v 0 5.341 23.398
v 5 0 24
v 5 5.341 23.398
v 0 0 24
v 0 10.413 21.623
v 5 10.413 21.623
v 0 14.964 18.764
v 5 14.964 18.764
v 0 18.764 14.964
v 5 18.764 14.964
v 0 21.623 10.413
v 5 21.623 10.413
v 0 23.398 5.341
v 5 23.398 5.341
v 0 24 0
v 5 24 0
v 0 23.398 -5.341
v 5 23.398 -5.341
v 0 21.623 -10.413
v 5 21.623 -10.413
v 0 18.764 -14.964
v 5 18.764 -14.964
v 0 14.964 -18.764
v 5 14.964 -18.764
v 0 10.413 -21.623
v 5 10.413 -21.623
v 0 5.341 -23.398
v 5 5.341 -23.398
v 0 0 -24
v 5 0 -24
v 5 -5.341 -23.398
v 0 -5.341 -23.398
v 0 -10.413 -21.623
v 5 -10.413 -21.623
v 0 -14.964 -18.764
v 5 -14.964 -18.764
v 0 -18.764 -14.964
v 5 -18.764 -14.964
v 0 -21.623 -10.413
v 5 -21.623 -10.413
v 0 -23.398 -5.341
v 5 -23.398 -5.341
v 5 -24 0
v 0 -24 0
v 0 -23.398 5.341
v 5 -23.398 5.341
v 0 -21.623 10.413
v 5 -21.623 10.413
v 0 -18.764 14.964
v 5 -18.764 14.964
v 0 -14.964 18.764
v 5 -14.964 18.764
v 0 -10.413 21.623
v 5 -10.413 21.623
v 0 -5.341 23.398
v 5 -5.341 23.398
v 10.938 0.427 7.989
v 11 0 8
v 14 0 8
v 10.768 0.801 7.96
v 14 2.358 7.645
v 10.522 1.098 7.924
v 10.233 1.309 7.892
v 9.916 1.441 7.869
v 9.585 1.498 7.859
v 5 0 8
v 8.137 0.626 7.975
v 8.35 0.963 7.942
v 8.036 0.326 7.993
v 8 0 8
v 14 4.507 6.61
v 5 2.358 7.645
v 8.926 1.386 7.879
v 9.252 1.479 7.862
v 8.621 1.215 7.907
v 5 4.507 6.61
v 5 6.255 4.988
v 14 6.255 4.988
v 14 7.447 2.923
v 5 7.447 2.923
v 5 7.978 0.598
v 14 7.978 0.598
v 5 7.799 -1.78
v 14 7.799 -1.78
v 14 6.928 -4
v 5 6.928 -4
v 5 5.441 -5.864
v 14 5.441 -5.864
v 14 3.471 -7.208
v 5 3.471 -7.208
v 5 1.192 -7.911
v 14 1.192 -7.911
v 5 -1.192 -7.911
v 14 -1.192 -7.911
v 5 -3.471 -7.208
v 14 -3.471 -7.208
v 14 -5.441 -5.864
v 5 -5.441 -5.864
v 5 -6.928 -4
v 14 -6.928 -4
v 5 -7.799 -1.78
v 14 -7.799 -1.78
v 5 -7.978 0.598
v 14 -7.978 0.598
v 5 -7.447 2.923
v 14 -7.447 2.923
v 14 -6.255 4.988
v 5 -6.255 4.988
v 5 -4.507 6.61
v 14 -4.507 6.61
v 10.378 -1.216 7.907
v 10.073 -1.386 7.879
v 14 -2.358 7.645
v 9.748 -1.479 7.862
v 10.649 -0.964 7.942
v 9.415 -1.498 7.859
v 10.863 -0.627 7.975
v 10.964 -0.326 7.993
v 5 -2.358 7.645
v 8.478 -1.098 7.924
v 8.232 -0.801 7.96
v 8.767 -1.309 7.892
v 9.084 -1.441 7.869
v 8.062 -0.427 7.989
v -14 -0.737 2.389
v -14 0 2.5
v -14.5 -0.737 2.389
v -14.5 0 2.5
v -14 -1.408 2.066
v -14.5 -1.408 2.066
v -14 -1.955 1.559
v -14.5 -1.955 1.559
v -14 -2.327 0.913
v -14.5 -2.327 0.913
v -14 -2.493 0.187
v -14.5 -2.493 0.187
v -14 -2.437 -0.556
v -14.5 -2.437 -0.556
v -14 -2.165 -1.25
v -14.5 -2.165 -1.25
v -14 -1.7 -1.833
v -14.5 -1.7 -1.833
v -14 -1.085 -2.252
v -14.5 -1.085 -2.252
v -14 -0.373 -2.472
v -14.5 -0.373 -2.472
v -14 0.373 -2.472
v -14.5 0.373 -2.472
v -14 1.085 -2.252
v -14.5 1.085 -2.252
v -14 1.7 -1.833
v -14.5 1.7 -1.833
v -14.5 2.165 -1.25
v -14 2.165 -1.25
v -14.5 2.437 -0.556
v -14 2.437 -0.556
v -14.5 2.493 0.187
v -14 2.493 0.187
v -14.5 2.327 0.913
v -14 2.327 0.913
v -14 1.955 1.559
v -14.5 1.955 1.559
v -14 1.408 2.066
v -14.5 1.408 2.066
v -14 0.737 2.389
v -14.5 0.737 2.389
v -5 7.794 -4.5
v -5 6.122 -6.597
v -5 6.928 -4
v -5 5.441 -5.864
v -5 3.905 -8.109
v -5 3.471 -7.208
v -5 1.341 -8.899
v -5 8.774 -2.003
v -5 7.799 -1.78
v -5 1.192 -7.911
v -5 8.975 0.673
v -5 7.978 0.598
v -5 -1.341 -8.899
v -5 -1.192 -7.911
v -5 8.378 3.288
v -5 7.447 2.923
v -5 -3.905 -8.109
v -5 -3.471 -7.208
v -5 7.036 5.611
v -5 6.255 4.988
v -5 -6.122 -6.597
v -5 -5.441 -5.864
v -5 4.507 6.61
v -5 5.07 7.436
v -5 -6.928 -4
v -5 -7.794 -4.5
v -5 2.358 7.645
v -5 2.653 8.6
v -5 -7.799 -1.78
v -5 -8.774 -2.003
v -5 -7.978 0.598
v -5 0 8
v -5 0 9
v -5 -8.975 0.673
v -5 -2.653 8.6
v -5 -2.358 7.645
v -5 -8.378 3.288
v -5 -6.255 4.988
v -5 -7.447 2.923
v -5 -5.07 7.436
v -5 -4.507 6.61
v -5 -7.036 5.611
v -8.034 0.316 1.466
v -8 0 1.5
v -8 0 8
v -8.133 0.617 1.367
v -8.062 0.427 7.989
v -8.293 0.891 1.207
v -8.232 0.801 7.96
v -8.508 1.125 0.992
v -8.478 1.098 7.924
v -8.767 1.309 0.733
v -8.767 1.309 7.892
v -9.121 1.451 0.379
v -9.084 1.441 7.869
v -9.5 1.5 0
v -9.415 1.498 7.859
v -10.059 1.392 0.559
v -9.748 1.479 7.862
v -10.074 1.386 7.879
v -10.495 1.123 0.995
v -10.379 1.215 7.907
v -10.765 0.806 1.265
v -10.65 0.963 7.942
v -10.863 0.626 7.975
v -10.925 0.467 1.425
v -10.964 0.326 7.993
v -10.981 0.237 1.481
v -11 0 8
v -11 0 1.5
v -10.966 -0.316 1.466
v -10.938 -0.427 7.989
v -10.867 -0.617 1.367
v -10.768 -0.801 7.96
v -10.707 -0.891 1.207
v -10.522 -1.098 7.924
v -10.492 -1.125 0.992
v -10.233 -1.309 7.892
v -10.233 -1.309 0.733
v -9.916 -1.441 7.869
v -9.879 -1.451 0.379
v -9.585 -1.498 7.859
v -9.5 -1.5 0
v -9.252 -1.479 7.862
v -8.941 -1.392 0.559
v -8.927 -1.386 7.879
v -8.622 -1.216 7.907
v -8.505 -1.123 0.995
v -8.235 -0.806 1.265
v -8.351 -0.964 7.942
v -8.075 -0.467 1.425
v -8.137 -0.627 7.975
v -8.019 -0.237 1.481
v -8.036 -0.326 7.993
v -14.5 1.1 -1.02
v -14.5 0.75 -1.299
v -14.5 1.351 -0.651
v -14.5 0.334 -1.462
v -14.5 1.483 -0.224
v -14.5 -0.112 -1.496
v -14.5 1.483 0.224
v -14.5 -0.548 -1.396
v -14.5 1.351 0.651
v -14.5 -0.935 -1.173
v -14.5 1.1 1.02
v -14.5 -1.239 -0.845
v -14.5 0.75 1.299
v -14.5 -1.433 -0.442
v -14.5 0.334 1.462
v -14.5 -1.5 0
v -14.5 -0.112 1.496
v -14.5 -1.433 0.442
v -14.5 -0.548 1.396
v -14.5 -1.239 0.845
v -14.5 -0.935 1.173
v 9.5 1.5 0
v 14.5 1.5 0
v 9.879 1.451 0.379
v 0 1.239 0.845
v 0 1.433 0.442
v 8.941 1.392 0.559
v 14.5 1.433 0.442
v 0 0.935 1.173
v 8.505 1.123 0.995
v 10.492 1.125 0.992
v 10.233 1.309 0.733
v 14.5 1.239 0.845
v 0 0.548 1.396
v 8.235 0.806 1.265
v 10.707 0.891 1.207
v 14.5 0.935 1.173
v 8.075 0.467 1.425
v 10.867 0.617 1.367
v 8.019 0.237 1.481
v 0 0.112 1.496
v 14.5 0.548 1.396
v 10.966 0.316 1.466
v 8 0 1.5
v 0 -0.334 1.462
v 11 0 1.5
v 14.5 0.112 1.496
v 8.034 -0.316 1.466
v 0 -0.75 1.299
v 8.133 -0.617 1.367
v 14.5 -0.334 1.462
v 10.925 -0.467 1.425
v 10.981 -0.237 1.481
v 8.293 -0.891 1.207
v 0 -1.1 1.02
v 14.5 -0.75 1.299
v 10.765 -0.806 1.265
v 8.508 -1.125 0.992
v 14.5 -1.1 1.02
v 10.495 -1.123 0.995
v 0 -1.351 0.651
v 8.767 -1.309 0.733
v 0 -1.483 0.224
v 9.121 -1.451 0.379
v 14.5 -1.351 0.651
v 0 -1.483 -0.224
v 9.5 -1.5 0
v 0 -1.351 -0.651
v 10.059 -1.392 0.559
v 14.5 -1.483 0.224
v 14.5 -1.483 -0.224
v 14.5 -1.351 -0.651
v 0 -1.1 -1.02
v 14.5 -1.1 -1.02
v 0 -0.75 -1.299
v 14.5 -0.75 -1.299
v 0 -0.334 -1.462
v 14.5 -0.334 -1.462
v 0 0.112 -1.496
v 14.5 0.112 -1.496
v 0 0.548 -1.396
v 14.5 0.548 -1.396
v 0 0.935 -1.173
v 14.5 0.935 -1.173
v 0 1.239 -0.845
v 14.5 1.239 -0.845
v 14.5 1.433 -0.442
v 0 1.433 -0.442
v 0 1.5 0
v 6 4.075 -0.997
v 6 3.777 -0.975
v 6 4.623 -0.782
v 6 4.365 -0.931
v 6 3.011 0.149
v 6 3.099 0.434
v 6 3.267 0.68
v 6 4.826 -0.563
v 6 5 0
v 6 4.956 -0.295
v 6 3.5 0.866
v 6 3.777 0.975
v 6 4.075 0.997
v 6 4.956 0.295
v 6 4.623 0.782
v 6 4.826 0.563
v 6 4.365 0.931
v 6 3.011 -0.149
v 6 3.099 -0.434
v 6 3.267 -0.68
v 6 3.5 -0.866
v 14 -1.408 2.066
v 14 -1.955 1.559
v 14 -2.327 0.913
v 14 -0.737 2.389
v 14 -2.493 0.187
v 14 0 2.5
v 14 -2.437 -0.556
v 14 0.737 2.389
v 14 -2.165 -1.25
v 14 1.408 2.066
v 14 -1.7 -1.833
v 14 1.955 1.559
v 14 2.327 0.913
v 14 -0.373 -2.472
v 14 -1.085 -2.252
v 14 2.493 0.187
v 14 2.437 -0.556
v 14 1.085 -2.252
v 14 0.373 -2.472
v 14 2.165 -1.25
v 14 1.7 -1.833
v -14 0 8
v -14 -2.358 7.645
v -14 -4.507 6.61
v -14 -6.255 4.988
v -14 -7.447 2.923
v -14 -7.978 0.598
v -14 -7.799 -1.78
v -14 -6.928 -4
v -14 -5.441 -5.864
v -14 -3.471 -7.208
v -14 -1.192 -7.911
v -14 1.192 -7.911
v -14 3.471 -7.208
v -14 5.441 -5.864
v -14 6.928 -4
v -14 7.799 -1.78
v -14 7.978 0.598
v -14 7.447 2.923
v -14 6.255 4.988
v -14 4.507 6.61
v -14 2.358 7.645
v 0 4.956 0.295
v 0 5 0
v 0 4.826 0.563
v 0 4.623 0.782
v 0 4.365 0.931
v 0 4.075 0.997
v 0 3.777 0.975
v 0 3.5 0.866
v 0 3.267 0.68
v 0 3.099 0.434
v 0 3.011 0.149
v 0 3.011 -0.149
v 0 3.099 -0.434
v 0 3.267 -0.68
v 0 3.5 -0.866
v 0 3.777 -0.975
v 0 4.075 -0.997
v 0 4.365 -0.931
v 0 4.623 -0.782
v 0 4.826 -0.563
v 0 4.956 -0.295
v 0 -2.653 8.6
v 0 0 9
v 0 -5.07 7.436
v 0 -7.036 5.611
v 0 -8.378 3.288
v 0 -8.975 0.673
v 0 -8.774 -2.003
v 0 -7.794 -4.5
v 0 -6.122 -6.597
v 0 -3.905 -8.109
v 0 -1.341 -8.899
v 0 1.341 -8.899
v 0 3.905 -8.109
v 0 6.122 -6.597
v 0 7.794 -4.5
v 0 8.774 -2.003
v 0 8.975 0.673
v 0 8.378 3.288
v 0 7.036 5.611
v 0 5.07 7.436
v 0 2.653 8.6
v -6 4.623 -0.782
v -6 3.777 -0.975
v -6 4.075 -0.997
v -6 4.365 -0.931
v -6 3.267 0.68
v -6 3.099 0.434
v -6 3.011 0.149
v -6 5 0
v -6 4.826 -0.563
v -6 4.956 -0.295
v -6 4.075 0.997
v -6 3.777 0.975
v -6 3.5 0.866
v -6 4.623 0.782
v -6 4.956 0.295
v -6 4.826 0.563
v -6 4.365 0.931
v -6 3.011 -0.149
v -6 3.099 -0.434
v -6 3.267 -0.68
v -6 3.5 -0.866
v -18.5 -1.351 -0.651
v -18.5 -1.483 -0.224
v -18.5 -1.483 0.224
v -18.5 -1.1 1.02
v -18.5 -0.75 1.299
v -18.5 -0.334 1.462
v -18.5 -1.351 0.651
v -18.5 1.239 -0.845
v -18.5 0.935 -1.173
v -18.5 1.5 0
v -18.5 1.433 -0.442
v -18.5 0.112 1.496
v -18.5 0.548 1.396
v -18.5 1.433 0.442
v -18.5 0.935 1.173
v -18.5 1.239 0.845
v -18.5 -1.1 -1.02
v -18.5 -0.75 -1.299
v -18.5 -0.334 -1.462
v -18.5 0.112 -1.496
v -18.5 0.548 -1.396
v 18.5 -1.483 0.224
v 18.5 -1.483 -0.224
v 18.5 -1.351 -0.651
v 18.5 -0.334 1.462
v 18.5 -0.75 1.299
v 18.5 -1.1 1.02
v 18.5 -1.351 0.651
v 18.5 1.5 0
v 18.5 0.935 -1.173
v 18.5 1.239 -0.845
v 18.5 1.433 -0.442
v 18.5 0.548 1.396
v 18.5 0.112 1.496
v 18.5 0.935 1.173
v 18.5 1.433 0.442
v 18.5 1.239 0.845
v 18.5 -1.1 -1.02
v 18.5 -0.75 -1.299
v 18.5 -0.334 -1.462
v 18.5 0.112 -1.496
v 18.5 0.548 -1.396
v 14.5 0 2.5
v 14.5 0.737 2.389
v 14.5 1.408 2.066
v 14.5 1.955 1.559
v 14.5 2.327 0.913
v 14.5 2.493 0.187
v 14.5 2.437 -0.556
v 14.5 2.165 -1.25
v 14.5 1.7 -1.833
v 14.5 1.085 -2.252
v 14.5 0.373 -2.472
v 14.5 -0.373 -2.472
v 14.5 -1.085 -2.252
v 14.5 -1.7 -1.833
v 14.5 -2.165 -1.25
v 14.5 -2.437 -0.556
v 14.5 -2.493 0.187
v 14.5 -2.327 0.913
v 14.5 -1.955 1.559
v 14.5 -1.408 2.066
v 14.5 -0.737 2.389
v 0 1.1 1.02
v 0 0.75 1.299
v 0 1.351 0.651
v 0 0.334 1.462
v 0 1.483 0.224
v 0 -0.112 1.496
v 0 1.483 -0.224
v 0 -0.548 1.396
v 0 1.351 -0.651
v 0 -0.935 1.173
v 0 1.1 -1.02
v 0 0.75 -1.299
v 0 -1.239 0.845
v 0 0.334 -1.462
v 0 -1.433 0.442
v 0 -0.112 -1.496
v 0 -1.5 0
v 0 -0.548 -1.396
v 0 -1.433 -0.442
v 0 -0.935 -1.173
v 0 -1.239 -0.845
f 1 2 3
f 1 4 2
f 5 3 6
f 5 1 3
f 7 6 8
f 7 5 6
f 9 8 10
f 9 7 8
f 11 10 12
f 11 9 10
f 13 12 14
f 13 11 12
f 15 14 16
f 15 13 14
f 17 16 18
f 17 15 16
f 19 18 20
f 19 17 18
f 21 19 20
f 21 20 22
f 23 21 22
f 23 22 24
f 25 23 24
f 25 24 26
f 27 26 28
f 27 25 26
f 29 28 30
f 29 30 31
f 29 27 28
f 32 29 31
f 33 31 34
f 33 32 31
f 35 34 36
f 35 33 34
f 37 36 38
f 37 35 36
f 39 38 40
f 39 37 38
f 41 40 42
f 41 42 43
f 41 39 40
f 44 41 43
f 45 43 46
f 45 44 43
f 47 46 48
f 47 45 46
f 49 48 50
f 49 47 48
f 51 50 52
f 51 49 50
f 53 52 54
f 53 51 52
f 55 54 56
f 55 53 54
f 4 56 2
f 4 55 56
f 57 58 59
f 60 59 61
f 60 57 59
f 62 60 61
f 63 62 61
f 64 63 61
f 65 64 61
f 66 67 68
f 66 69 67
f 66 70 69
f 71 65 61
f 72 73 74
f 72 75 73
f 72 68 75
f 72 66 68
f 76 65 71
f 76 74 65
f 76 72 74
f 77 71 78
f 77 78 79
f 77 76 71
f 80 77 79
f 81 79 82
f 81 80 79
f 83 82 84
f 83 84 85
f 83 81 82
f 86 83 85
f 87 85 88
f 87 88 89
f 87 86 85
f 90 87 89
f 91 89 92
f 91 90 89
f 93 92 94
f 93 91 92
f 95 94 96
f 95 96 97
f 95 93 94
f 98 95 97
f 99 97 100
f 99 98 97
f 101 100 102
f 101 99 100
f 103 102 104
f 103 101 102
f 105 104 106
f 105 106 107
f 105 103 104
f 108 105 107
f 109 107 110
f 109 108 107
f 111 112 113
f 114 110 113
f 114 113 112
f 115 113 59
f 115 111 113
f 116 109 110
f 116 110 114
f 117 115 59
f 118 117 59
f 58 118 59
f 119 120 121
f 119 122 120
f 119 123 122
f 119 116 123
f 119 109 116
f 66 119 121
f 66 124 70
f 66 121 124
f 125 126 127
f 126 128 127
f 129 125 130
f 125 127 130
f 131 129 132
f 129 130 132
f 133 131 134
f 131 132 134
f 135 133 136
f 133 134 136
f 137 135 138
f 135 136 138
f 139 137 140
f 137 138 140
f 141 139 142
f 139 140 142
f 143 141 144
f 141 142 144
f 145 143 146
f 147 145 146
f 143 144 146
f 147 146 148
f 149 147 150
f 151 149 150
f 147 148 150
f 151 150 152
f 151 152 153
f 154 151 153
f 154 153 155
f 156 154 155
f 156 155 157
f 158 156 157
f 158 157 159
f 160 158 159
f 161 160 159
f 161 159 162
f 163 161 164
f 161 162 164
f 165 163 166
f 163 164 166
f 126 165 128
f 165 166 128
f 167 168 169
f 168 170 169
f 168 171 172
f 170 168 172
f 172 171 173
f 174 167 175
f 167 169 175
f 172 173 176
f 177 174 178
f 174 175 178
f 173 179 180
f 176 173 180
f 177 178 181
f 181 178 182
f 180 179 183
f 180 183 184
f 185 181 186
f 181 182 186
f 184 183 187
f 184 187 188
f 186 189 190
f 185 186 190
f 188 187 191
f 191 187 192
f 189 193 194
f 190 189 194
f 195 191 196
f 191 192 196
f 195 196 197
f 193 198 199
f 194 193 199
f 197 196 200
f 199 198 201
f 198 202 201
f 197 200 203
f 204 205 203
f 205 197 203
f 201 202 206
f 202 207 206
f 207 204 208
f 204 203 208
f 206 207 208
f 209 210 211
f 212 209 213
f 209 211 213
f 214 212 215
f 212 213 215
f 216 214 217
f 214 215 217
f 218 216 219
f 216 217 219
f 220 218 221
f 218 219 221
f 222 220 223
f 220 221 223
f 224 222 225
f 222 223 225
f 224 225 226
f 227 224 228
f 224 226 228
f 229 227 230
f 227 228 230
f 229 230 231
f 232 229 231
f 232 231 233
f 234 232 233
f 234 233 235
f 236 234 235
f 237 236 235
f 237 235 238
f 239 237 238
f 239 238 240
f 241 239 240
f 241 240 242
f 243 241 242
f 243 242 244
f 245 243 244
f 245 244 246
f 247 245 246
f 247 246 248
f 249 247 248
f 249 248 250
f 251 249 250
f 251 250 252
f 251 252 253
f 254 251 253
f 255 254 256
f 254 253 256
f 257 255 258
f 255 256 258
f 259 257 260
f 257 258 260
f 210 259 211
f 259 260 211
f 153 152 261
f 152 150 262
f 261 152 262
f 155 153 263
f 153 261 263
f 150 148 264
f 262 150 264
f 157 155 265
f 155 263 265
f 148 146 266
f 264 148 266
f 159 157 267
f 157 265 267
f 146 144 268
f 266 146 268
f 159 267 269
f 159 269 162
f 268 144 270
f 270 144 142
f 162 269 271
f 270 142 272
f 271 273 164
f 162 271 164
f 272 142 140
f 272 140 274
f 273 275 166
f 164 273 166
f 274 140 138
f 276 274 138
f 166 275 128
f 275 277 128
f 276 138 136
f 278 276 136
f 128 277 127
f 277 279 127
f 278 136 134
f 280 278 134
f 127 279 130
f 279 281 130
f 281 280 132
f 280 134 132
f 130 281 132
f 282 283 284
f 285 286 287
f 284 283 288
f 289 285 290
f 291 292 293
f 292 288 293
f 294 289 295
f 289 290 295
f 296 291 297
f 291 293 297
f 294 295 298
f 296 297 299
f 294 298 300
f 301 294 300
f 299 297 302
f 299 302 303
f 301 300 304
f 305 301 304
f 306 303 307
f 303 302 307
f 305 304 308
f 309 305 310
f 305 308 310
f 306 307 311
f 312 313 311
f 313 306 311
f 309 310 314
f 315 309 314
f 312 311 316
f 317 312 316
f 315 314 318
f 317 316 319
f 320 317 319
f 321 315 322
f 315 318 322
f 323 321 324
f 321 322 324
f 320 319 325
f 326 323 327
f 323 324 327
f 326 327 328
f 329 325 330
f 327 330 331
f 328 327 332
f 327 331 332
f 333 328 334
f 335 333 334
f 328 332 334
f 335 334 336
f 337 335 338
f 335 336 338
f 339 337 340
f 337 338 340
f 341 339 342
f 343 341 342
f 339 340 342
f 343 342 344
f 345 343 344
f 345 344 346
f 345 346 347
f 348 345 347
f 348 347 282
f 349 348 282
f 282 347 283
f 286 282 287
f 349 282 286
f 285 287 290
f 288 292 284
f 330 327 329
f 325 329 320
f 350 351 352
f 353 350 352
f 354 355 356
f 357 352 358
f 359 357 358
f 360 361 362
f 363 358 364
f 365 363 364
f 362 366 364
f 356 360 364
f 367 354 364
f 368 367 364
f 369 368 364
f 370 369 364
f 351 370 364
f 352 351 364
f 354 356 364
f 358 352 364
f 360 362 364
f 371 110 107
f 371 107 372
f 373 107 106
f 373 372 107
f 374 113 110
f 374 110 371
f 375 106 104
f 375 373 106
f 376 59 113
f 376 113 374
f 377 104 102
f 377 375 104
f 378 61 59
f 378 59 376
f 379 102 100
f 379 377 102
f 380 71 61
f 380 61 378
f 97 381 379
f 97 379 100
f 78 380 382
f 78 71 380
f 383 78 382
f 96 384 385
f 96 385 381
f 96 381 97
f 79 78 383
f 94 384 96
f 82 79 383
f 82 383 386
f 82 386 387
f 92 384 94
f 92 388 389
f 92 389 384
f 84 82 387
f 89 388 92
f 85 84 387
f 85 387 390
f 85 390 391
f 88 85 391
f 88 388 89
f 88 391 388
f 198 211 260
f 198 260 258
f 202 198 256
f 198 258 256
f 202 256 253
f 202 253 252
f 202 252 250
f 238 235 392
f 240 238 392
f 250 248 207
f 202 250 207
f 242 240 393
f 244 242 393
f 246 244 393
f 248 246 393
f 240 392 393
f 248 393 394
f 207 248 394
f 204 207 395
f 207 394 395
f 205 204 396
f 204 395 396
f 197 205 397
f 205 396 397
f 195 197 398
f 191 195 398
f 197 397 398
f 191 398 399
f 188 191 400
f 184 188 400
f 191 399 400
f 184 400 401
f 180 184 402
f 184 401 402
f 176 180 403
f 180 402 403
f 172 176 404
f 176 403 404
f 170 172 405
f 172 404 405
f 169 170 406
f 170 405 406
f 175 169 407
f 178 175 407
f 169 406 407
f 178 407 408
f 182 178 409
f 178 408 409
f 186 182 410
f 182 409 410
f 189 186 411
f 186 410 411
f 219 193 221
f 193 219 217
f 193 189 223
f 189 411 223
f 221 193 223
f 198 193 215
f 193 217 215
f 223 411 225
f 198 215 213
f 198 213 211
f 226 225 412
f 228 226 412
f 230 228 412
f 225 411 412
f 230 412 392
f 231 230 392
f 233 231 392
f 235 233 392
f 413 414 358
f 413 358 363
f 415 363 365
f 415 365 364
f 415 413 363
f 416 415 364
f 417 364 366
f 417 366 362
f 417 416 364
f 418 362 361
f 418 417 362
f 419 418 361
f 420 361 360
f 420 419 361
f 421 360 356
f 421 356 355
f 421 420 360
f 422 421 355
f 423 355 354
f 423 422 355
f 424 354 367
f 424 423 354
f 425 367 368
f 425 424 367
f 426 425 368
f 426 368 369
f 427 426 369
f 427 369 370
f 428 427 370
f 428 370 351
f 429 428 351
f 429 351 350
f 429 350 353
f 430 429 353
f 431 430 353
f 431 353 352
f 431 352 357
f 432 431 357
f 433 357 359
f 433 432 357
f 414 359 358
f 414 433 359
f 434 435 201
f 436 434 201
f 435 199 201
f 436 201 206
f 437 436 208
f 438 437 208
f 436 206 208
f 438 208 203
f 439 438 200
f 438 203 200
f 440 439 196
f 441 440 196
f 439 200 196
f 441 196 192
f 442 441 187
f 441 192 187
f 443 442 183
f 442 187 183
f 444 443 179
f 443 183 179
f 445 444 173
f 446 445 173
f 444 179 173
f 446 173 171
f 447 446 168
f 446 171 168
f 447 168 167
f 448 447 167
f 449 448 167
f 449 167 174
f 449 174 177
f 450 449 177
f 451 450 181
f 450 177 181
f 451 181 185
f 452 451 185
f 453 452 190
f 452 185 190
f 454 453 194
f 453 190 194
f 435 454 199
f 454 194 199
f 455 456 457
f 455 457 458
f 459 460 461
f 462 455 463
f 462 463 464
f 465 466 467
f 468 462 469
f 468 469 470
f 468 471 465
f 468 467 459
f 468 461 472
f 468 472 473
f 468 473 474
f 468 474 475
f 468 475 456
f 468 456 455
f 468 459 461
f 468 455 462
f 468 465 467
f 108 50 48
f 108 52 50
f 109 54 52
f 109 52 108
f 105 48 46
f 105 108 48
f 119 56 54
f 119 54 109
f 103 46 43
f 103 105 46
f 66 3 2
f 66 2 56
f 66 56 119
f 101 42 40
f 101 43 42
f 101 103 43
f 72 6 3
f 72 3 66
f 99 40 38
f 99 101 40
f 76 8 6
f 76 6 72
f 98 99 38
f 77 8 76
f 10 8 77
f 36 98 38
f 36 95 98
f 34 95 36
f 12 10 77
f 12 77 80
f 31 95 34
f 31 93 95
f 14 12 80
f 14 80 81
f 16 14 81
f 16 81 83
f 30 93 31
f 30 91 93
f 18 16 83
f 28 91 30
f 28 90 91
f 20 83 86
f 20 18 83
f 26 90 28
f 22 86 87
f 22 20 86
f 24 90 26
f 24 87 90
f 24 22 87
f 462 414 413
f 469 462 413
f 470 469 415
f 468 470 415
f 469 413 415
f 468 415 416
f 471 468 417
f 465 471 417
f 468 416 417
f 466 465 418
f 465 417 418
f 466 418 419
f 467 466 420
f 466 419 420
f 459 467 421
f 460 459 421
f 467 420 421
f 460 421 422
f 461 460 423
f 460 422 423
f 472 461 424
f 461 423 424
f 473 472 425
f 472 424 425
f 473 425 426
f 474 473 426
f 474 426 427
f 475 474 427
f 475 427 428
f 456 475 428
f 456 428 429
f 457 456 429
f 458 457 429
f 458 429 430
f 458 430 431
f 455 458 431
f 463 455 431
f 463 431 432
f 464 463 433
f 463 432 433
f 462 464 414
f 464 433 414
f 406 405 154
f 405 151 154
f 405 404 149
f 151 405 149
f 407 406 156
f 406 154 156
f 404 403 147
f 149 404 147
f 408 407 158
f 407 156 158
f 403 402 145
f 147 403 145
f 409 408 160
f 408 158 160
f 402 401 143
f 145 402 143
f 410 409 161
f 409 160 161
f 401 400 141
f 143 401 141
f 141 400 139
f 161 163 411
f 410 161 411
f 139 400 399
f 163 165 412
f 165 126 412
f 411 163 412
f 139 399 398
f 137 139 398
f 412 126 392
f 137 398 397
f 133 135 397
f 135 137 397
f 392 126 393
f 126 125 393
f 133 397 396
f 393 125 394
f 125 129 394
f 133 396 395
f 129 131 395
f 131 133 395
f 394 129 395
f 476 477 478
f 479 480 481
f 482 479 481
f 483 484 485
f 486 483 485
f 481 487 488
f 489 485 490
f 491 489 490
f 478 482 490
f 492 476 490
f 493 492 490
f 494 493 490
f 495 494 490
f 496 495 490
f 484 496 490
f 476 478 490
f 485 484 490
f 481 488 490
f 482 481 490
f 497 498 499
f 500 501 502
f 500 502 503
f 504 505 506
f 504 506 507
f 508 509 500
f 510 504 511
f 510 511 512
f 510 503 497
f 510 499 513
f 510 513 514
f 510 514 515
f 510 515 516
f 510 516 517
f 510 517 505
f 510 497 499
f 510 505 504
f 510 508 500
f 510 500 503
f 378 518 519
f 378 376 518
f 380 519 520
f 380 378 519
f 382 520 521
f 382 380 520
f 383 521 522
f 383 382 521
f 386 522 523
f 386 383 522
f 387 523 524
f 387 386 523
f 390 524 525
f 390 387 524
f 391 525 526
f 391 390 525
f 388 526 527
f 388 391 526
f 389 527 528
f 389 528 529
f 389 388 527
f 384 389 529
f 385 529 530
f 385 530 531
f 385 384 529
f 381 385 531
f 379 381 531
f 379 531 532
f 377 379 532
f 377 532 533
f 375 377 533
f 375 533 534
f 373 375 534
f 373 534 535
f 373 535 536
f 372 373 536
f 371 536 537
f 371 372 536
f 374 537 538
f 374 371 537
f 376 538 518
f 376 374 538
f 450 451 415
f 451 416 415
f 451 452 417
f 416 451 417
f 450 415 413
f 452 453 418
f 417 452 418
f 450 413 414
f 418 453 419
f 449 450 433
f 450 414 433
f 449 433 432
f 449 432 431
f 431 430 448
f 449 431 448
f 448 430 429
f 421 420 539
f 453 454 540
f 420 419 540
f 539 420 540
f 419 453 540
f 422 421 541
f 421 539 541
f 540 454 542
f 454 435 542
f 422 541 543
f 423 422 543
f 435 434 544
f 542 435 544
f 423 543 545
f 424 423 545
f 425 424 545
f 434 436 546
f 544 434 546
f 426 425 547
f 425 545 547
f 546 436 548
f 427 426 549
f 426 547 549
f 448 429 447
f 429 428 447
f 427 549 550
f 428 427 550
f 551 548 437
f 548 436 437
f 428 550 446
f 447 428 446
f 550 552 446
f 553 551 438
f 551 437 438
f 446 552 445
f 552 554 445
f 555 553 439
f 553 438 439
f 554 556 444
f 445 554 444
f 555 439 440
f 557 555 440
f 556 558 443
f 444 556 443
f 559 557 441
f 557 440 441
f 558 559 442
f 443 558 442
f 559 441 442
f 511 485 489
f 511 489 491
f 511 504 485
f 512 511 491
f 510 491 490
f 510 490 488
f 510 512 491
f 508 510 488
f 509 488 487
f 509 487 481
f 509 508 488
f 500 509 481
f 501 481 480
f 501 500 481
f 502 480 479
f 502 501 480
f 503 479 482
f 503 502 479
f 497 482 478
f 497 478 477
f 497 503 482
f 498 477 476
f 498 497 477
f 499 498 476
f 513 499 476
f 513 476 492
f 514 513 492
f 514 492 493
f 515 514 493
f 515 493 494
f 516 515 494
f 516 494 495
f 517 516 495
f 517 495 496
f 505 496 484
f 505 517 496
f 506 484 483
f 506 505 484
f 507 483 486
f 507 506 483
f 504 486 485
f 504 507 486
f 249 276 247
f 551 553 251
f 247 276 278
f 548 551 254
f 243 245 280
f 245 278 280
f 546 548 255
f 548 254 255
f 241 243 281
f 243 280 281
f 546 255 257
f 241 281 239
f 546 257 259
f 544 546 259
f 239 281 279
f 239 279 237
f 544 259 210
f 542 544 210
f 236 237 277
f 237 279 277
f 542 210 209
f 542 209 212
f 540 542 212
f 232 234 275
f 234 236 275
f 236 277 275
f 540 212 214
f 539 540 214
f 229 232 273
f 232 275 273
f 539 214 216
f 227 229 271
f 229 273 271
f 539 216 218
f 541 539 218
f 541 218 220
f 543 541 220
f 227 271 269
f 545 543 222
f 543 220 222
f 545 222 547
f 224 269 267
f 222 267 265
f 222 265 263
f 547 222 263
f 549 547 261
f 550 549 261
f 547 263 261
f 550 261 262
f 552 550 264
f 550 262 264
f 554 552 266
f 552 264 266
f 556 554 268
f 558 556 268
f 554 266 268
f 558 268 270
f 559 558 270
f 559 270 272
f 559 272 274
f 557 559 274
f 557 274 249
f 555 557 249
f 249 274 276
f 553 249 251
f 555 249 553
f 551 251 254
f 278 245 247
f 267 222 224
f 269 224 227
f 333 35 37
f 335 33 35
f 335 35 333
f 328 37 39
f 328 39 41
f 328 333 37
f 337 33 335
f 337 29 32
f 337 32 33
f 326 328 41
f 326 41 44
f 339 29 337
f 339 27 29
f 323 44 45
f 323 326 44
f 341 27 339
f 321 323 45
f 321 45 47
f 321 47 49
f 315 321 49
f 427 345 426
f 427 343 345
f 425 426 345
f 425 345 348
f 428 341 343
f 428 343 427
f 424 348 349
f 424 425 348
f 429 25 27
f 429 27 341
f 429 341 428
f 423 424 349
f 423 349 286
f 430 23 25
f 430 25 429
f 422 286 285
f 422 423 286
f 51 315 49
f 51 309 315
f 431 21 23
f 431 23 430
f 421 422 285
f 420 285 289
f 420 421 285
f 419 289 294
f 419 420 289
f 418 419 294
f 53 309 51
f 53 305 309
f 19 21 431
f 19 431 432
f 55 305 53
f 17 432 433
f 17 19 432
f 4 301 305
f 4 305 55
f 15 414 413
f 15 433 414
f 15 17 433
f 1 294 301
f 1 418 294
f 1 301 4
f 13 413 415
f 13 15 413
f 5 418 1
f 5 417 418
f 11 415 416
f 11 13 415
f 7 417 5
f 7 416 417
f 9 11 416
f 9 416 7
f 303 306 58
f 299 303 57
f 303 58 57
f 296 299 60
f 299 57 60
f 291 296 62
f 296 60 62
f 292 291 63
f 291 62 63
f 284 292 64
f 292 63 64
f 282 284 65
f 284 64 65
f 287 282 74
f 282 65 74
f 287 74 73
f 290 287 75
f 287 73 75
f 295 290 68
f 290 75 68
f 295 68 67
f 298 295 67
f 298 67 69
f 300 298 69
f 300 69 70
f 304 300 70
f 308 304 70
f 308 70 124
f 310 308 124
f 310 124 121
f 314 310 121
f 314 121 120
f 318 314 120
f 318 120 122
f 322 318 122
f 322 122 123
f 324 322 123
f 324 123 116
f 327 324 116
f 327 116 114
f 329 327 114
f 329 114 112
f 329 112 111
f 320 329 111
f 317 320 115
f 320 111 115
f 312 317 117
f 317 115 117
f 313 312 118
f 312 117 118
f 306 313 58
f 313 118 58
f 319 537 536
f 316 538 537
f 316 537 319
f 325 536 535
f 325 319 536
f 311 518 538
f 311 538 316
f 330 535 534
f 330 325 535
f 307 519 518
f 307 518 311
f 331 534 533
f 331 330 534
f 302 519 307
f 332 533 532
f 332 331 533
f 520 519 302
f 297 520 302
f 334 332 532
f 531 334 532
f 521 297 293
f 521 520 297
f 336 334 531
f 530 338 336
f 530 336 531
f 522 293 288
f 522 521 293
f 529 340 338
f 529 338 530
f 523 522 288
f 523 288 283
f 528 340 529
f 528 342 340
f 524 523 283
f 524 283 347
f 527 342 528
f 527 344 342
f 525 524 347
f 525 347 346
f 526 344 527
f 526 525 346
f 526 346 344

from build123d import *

# Parameters (mm, degrees)
F3_R      = 1.5
F4_DEPTH  = 8
F5_R      = 1.5
F6_DEPTH  = 14.501
F9_R      = 1.5
F10_DEPTH = 8
F11_R     = 1.5
F12_DEPTH = 14.5
F13_R     = 1
F14_DEPTH = 6
F15_DEPTH = 6
F16_R     = 1.5
F17_DEPTH = 18.5


with BuildPart() as f1:
    # F0 (on Front) → F1 (revolve)
    with BuildSketch(Plane.XZ):
        Polygon((0, 24), (0, 0), (14.5, 0), (14.5, 2.5), (14, 2.5), (14, 8), (5, 8), (5, 24), align=None)
    revolve(axis=Axis((7.25, 0, 0), (-1, 0, 0)))

    # F3 (on line) → F4 (cut)
    with BuildSketch(Plane.XY.offset(8)):
        with Locations((9.5, 0)):
            Circle(F3_R)
    extrude(amount=-F4_DEPTH, mode=Mode.SUBTRACT)

    # F5 (on face) → F6 (cut, through all)
    with BuildSketch(Plane.YZ.offset(14.5)):
        Circle(F5_R)
    extrude(amount=-F6_DEPTH, mode=Mode.SUBTRACT)

    # F13 (on face) → F15 (cut)
    with BuildSketch(Plane.YZ):
        with Locations((4, 0)):
            Circle(F13_R)
    extrude(amount=F15_DEPTH, mode=Mode.SUBTRACT)


with BuildPart() as f8:
    # F7 (on Front) → F8 (revolve)
    with BuildSketch(Plane.XZ):
        Polygon((-14.5, 0), (0, 0), (0, 9), (-5, 9), (-5, 8), (-14, 8), (-14, 2.5), (-14.5, 2.5), align=None)
    revolve(axis=Axis((-7.25, 0, 0), (1, 0, 0)))

    # F9 (on line) → F10 (cut)
    with BuildSketch(Plane.XY.offset(8)):
        with Locations((-9.5, 0)):
            Circle(F9_R)
    extrude(amount=-F10_DEPTH, mode=Mode.SUBTRACT)

    # F11 (on face) → F12 (cut, through all)
    with BuildSketch(Plane(origin=(-14.5, 0, 0), x_dir=(0, -1, 0), z_dir=(-1, 0, 0))):
        Circle(F11_R)
    extrude(amount=-F12_DEPTH, mode=Mode.SUBTRACT)

    # F13 (on face) → F14 (cut)
    with BuildSketch(Plane.YZ):
        with Locations((4, 0)):
            Circle(F13_R)
    extrude(amount=-F14_DEPTH, mode=Mode.SUBTRACT)


with BuildPart() as f17:
    # F16 (on Right) → F17 (new body, symmetric)
    with BuildSketch(Plane.YZ):
        Circle(F16_R)
    extrude(amount=F17_DEPTH, both=True)


solid = Compound([f1.part, f8.part, f17.part])
